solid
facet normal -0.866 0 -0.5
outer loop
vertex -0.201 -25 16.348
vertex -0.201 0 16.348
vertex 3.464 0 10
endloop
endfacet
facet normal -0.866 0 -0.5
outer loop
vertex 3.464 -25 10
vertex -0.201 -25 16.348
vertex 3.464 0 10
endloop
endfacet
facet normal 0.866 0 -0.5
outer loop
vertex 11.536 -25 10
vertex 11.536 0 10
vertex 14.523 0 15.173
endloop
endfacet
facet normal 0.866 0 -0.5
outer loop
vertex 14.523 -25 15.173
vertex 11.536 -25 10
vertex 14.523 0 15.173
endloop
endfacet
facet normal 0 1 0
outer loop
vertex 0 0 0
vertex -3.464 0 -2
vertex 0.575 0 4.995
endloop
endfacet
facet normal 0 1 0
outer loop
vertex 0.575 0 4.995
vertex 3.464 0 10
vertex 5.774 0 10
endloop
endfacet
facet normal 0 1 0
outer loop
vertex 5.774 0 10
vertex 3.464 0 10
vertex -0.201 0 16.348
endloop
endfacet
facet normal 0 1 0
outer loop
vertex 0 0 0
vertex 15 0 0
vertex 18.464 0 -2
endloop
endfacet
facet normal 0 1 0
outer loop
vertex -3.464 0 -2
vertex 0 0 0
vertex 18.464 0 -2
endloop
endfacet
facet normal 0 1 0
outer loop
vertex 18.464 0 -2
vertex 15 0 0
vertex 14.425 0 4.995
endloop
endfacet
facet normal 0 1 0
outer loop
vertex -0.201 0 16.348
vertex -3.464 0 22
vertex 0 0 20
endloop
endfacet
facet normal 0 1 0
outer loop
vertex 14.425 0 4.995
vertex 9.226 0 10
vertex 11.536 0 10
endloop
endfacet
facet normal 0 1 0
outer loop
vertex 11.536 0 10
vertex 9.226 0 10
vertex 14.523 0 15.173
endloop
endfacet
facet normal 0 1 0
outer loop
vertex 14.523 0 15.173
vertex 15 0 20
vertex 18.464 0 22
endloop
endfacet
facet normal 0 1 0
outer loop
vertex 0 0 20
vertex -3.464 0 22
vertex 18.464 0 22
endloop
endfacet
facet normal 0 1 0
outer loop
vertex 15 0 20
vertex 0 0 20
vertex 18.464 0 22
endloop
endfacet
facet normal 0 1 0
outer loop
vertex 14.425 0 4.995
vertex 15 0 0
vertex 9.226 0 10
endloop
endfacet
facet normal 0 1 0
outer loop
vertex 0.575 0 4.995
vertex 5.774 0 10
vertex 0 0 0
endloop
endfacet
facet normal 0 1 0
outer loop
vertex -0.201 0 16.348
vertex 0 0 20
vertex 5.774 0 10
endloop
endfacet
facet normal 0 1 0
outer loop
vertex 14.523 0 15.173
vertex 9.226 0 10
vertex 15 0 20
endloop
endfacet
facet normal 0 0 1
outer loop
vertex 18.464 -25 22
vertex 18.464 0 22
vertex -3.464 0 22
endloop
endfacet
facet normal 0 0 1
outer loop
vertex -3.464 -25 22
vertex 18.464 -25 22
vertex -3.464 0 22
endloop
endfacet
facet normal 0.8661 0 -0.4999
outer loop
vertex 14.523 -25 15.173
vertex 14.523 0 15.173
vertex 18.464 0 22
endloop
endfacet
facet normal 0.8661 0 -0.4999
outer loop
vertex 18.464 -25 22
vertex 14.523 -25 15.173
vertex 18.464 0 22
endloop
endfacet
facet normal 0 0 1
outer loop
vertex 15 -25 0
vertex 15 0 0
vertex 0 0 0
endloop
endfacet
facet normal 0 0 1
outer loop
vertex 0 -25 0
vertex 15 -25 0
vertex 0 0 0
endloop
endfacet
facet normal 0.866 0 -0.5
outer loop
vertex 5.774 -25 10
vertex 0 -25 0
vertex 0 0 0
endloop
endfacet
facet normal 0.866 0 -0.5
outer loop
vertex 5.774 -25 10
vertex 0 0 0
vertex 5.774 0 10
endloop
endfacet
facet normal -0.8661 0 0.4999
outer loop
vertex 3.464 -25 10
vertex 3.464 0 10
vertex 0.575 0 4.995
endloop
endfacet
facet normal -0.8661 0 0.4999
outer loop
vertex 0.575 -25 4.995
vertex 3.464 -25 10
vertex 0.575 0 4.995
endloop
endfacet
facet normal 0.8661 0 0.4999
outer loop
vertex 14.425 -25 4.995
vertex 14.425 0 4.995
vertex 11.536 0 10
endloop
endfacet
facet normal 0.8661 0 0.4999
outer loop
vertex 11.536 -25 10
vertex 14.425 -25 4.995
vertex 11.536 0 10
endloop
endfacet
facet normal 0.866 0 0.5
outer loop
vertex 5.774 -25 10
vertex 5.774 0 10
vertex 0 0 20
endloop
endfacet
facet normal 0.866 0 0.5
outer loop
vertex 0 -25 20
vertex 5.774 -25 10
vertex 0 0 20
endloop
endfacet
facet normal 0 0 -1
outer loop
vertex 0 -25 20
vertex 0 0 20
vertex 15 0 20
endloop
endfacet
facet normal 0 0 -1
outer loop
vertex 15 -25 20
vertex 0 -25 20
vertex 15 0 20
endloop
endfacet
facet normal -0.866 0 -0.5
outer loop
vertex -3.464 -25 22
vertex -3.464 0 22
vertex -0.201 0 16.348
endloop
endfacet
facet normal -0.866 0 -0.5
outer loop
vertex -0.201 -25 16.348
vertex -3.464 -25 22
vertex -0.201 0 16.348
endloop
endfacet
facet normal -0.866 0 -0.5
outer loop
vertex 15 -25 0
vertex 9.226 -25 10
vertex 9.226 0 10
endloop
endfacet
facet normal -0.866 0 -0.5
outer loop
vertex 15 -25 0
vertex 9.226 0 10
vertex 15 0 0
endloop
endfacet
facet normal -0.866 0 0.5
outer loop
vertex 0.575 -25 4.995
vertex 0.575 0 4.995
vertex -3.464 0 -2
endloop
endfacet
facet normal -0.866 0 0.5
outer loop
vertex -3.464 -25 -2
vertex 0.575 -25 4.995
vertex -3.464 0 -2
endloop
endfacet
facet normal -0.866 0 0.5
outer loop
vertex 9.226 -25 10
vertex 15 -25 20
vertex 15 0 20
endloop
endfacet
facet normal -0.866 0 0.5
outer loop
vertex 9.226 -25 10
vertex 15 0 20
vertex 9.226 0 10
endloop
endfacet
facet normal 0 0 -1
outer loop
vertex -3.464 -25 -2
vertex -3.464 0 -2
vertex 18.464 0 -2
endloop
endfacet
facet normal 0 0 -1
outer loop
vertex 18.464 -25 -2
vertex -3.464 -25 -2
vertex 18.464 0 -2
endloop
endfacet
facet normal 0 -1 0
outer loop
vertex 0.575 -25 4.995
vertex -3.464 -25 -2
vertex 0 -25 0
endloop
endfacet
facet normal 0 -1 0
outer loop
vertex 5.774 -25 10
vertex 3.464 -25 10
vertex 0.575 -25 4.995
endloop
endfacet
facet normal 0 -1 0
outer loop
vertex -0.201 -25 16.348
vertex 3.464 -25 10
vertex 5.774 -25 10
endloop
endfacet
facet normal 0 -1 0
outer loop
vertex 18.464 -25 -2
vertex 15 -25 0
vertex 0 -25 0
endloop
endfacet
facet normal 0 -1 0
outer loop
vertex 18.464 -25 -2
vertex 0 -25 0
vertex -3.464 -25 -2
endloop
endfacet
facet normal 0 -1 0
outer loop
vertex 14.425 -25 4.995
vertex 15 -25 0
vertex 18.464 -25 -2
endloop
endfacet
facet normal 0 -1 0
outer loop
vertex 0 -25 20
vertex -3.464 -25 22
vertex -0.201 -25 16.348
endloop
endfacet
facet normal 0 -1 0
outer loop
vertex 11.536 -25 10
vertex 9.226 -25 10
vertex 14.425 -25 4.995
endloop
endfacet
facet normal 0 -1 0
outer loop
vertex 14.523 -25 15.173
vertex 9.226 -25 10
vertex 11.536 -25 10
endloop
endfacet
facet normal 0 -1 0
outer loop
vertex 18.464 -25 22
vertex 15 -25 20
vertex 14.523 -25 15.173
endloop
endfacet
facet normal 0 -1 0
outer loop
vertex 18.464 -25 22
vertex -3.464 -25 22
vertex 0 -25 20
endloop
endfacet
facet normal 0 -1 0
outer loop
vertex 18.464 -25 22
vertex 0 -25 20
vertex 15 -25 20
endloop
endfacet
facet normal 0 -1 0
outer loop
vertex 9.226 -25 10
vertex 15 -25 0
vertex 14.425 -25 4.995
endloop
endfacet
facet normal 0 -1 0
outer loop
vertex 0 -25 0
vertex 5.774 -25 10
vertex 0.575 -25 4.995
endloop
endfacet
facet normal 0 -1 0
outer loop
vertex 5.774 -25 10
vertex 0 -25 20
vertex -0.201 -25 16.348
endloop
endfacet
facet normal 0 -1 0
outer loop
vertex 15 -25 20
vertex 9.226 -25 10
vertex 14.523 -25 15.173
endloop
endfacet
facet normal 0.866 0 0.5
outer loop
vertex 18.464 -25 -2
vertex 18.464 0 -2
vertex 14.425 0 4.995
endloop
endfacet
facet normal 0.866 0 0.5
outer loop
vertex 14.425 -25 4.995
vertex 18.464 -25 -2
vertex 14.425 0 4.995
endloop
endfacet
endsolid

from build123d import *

# Parameters (mm, degrees)
F1_DEPTH = 25


with BuildPart() as f1:
    # F0 (on Front) → F1 (new body)
    with BuildSketch(Plane.XZ):
        Polygon((3.464102, 10), (0.574671, 4.99536), (-3.464102, -2), (18.464102, -2), (14.425329, 4.99536), (11.535898, 10), (14.522771, 15.173416), (18.464102, 22), (-3.464102, 22), (-0.201125, 16.348359), align=None)
        Polygon((15, 0), (0, 0), (5.773503, 10), (0, 20), (15, 20), (9.226497, 10), align=None, mode=Mode.SUBTRACT)
    extrude(amount=F1_DEPTH)


solid = f1.part
